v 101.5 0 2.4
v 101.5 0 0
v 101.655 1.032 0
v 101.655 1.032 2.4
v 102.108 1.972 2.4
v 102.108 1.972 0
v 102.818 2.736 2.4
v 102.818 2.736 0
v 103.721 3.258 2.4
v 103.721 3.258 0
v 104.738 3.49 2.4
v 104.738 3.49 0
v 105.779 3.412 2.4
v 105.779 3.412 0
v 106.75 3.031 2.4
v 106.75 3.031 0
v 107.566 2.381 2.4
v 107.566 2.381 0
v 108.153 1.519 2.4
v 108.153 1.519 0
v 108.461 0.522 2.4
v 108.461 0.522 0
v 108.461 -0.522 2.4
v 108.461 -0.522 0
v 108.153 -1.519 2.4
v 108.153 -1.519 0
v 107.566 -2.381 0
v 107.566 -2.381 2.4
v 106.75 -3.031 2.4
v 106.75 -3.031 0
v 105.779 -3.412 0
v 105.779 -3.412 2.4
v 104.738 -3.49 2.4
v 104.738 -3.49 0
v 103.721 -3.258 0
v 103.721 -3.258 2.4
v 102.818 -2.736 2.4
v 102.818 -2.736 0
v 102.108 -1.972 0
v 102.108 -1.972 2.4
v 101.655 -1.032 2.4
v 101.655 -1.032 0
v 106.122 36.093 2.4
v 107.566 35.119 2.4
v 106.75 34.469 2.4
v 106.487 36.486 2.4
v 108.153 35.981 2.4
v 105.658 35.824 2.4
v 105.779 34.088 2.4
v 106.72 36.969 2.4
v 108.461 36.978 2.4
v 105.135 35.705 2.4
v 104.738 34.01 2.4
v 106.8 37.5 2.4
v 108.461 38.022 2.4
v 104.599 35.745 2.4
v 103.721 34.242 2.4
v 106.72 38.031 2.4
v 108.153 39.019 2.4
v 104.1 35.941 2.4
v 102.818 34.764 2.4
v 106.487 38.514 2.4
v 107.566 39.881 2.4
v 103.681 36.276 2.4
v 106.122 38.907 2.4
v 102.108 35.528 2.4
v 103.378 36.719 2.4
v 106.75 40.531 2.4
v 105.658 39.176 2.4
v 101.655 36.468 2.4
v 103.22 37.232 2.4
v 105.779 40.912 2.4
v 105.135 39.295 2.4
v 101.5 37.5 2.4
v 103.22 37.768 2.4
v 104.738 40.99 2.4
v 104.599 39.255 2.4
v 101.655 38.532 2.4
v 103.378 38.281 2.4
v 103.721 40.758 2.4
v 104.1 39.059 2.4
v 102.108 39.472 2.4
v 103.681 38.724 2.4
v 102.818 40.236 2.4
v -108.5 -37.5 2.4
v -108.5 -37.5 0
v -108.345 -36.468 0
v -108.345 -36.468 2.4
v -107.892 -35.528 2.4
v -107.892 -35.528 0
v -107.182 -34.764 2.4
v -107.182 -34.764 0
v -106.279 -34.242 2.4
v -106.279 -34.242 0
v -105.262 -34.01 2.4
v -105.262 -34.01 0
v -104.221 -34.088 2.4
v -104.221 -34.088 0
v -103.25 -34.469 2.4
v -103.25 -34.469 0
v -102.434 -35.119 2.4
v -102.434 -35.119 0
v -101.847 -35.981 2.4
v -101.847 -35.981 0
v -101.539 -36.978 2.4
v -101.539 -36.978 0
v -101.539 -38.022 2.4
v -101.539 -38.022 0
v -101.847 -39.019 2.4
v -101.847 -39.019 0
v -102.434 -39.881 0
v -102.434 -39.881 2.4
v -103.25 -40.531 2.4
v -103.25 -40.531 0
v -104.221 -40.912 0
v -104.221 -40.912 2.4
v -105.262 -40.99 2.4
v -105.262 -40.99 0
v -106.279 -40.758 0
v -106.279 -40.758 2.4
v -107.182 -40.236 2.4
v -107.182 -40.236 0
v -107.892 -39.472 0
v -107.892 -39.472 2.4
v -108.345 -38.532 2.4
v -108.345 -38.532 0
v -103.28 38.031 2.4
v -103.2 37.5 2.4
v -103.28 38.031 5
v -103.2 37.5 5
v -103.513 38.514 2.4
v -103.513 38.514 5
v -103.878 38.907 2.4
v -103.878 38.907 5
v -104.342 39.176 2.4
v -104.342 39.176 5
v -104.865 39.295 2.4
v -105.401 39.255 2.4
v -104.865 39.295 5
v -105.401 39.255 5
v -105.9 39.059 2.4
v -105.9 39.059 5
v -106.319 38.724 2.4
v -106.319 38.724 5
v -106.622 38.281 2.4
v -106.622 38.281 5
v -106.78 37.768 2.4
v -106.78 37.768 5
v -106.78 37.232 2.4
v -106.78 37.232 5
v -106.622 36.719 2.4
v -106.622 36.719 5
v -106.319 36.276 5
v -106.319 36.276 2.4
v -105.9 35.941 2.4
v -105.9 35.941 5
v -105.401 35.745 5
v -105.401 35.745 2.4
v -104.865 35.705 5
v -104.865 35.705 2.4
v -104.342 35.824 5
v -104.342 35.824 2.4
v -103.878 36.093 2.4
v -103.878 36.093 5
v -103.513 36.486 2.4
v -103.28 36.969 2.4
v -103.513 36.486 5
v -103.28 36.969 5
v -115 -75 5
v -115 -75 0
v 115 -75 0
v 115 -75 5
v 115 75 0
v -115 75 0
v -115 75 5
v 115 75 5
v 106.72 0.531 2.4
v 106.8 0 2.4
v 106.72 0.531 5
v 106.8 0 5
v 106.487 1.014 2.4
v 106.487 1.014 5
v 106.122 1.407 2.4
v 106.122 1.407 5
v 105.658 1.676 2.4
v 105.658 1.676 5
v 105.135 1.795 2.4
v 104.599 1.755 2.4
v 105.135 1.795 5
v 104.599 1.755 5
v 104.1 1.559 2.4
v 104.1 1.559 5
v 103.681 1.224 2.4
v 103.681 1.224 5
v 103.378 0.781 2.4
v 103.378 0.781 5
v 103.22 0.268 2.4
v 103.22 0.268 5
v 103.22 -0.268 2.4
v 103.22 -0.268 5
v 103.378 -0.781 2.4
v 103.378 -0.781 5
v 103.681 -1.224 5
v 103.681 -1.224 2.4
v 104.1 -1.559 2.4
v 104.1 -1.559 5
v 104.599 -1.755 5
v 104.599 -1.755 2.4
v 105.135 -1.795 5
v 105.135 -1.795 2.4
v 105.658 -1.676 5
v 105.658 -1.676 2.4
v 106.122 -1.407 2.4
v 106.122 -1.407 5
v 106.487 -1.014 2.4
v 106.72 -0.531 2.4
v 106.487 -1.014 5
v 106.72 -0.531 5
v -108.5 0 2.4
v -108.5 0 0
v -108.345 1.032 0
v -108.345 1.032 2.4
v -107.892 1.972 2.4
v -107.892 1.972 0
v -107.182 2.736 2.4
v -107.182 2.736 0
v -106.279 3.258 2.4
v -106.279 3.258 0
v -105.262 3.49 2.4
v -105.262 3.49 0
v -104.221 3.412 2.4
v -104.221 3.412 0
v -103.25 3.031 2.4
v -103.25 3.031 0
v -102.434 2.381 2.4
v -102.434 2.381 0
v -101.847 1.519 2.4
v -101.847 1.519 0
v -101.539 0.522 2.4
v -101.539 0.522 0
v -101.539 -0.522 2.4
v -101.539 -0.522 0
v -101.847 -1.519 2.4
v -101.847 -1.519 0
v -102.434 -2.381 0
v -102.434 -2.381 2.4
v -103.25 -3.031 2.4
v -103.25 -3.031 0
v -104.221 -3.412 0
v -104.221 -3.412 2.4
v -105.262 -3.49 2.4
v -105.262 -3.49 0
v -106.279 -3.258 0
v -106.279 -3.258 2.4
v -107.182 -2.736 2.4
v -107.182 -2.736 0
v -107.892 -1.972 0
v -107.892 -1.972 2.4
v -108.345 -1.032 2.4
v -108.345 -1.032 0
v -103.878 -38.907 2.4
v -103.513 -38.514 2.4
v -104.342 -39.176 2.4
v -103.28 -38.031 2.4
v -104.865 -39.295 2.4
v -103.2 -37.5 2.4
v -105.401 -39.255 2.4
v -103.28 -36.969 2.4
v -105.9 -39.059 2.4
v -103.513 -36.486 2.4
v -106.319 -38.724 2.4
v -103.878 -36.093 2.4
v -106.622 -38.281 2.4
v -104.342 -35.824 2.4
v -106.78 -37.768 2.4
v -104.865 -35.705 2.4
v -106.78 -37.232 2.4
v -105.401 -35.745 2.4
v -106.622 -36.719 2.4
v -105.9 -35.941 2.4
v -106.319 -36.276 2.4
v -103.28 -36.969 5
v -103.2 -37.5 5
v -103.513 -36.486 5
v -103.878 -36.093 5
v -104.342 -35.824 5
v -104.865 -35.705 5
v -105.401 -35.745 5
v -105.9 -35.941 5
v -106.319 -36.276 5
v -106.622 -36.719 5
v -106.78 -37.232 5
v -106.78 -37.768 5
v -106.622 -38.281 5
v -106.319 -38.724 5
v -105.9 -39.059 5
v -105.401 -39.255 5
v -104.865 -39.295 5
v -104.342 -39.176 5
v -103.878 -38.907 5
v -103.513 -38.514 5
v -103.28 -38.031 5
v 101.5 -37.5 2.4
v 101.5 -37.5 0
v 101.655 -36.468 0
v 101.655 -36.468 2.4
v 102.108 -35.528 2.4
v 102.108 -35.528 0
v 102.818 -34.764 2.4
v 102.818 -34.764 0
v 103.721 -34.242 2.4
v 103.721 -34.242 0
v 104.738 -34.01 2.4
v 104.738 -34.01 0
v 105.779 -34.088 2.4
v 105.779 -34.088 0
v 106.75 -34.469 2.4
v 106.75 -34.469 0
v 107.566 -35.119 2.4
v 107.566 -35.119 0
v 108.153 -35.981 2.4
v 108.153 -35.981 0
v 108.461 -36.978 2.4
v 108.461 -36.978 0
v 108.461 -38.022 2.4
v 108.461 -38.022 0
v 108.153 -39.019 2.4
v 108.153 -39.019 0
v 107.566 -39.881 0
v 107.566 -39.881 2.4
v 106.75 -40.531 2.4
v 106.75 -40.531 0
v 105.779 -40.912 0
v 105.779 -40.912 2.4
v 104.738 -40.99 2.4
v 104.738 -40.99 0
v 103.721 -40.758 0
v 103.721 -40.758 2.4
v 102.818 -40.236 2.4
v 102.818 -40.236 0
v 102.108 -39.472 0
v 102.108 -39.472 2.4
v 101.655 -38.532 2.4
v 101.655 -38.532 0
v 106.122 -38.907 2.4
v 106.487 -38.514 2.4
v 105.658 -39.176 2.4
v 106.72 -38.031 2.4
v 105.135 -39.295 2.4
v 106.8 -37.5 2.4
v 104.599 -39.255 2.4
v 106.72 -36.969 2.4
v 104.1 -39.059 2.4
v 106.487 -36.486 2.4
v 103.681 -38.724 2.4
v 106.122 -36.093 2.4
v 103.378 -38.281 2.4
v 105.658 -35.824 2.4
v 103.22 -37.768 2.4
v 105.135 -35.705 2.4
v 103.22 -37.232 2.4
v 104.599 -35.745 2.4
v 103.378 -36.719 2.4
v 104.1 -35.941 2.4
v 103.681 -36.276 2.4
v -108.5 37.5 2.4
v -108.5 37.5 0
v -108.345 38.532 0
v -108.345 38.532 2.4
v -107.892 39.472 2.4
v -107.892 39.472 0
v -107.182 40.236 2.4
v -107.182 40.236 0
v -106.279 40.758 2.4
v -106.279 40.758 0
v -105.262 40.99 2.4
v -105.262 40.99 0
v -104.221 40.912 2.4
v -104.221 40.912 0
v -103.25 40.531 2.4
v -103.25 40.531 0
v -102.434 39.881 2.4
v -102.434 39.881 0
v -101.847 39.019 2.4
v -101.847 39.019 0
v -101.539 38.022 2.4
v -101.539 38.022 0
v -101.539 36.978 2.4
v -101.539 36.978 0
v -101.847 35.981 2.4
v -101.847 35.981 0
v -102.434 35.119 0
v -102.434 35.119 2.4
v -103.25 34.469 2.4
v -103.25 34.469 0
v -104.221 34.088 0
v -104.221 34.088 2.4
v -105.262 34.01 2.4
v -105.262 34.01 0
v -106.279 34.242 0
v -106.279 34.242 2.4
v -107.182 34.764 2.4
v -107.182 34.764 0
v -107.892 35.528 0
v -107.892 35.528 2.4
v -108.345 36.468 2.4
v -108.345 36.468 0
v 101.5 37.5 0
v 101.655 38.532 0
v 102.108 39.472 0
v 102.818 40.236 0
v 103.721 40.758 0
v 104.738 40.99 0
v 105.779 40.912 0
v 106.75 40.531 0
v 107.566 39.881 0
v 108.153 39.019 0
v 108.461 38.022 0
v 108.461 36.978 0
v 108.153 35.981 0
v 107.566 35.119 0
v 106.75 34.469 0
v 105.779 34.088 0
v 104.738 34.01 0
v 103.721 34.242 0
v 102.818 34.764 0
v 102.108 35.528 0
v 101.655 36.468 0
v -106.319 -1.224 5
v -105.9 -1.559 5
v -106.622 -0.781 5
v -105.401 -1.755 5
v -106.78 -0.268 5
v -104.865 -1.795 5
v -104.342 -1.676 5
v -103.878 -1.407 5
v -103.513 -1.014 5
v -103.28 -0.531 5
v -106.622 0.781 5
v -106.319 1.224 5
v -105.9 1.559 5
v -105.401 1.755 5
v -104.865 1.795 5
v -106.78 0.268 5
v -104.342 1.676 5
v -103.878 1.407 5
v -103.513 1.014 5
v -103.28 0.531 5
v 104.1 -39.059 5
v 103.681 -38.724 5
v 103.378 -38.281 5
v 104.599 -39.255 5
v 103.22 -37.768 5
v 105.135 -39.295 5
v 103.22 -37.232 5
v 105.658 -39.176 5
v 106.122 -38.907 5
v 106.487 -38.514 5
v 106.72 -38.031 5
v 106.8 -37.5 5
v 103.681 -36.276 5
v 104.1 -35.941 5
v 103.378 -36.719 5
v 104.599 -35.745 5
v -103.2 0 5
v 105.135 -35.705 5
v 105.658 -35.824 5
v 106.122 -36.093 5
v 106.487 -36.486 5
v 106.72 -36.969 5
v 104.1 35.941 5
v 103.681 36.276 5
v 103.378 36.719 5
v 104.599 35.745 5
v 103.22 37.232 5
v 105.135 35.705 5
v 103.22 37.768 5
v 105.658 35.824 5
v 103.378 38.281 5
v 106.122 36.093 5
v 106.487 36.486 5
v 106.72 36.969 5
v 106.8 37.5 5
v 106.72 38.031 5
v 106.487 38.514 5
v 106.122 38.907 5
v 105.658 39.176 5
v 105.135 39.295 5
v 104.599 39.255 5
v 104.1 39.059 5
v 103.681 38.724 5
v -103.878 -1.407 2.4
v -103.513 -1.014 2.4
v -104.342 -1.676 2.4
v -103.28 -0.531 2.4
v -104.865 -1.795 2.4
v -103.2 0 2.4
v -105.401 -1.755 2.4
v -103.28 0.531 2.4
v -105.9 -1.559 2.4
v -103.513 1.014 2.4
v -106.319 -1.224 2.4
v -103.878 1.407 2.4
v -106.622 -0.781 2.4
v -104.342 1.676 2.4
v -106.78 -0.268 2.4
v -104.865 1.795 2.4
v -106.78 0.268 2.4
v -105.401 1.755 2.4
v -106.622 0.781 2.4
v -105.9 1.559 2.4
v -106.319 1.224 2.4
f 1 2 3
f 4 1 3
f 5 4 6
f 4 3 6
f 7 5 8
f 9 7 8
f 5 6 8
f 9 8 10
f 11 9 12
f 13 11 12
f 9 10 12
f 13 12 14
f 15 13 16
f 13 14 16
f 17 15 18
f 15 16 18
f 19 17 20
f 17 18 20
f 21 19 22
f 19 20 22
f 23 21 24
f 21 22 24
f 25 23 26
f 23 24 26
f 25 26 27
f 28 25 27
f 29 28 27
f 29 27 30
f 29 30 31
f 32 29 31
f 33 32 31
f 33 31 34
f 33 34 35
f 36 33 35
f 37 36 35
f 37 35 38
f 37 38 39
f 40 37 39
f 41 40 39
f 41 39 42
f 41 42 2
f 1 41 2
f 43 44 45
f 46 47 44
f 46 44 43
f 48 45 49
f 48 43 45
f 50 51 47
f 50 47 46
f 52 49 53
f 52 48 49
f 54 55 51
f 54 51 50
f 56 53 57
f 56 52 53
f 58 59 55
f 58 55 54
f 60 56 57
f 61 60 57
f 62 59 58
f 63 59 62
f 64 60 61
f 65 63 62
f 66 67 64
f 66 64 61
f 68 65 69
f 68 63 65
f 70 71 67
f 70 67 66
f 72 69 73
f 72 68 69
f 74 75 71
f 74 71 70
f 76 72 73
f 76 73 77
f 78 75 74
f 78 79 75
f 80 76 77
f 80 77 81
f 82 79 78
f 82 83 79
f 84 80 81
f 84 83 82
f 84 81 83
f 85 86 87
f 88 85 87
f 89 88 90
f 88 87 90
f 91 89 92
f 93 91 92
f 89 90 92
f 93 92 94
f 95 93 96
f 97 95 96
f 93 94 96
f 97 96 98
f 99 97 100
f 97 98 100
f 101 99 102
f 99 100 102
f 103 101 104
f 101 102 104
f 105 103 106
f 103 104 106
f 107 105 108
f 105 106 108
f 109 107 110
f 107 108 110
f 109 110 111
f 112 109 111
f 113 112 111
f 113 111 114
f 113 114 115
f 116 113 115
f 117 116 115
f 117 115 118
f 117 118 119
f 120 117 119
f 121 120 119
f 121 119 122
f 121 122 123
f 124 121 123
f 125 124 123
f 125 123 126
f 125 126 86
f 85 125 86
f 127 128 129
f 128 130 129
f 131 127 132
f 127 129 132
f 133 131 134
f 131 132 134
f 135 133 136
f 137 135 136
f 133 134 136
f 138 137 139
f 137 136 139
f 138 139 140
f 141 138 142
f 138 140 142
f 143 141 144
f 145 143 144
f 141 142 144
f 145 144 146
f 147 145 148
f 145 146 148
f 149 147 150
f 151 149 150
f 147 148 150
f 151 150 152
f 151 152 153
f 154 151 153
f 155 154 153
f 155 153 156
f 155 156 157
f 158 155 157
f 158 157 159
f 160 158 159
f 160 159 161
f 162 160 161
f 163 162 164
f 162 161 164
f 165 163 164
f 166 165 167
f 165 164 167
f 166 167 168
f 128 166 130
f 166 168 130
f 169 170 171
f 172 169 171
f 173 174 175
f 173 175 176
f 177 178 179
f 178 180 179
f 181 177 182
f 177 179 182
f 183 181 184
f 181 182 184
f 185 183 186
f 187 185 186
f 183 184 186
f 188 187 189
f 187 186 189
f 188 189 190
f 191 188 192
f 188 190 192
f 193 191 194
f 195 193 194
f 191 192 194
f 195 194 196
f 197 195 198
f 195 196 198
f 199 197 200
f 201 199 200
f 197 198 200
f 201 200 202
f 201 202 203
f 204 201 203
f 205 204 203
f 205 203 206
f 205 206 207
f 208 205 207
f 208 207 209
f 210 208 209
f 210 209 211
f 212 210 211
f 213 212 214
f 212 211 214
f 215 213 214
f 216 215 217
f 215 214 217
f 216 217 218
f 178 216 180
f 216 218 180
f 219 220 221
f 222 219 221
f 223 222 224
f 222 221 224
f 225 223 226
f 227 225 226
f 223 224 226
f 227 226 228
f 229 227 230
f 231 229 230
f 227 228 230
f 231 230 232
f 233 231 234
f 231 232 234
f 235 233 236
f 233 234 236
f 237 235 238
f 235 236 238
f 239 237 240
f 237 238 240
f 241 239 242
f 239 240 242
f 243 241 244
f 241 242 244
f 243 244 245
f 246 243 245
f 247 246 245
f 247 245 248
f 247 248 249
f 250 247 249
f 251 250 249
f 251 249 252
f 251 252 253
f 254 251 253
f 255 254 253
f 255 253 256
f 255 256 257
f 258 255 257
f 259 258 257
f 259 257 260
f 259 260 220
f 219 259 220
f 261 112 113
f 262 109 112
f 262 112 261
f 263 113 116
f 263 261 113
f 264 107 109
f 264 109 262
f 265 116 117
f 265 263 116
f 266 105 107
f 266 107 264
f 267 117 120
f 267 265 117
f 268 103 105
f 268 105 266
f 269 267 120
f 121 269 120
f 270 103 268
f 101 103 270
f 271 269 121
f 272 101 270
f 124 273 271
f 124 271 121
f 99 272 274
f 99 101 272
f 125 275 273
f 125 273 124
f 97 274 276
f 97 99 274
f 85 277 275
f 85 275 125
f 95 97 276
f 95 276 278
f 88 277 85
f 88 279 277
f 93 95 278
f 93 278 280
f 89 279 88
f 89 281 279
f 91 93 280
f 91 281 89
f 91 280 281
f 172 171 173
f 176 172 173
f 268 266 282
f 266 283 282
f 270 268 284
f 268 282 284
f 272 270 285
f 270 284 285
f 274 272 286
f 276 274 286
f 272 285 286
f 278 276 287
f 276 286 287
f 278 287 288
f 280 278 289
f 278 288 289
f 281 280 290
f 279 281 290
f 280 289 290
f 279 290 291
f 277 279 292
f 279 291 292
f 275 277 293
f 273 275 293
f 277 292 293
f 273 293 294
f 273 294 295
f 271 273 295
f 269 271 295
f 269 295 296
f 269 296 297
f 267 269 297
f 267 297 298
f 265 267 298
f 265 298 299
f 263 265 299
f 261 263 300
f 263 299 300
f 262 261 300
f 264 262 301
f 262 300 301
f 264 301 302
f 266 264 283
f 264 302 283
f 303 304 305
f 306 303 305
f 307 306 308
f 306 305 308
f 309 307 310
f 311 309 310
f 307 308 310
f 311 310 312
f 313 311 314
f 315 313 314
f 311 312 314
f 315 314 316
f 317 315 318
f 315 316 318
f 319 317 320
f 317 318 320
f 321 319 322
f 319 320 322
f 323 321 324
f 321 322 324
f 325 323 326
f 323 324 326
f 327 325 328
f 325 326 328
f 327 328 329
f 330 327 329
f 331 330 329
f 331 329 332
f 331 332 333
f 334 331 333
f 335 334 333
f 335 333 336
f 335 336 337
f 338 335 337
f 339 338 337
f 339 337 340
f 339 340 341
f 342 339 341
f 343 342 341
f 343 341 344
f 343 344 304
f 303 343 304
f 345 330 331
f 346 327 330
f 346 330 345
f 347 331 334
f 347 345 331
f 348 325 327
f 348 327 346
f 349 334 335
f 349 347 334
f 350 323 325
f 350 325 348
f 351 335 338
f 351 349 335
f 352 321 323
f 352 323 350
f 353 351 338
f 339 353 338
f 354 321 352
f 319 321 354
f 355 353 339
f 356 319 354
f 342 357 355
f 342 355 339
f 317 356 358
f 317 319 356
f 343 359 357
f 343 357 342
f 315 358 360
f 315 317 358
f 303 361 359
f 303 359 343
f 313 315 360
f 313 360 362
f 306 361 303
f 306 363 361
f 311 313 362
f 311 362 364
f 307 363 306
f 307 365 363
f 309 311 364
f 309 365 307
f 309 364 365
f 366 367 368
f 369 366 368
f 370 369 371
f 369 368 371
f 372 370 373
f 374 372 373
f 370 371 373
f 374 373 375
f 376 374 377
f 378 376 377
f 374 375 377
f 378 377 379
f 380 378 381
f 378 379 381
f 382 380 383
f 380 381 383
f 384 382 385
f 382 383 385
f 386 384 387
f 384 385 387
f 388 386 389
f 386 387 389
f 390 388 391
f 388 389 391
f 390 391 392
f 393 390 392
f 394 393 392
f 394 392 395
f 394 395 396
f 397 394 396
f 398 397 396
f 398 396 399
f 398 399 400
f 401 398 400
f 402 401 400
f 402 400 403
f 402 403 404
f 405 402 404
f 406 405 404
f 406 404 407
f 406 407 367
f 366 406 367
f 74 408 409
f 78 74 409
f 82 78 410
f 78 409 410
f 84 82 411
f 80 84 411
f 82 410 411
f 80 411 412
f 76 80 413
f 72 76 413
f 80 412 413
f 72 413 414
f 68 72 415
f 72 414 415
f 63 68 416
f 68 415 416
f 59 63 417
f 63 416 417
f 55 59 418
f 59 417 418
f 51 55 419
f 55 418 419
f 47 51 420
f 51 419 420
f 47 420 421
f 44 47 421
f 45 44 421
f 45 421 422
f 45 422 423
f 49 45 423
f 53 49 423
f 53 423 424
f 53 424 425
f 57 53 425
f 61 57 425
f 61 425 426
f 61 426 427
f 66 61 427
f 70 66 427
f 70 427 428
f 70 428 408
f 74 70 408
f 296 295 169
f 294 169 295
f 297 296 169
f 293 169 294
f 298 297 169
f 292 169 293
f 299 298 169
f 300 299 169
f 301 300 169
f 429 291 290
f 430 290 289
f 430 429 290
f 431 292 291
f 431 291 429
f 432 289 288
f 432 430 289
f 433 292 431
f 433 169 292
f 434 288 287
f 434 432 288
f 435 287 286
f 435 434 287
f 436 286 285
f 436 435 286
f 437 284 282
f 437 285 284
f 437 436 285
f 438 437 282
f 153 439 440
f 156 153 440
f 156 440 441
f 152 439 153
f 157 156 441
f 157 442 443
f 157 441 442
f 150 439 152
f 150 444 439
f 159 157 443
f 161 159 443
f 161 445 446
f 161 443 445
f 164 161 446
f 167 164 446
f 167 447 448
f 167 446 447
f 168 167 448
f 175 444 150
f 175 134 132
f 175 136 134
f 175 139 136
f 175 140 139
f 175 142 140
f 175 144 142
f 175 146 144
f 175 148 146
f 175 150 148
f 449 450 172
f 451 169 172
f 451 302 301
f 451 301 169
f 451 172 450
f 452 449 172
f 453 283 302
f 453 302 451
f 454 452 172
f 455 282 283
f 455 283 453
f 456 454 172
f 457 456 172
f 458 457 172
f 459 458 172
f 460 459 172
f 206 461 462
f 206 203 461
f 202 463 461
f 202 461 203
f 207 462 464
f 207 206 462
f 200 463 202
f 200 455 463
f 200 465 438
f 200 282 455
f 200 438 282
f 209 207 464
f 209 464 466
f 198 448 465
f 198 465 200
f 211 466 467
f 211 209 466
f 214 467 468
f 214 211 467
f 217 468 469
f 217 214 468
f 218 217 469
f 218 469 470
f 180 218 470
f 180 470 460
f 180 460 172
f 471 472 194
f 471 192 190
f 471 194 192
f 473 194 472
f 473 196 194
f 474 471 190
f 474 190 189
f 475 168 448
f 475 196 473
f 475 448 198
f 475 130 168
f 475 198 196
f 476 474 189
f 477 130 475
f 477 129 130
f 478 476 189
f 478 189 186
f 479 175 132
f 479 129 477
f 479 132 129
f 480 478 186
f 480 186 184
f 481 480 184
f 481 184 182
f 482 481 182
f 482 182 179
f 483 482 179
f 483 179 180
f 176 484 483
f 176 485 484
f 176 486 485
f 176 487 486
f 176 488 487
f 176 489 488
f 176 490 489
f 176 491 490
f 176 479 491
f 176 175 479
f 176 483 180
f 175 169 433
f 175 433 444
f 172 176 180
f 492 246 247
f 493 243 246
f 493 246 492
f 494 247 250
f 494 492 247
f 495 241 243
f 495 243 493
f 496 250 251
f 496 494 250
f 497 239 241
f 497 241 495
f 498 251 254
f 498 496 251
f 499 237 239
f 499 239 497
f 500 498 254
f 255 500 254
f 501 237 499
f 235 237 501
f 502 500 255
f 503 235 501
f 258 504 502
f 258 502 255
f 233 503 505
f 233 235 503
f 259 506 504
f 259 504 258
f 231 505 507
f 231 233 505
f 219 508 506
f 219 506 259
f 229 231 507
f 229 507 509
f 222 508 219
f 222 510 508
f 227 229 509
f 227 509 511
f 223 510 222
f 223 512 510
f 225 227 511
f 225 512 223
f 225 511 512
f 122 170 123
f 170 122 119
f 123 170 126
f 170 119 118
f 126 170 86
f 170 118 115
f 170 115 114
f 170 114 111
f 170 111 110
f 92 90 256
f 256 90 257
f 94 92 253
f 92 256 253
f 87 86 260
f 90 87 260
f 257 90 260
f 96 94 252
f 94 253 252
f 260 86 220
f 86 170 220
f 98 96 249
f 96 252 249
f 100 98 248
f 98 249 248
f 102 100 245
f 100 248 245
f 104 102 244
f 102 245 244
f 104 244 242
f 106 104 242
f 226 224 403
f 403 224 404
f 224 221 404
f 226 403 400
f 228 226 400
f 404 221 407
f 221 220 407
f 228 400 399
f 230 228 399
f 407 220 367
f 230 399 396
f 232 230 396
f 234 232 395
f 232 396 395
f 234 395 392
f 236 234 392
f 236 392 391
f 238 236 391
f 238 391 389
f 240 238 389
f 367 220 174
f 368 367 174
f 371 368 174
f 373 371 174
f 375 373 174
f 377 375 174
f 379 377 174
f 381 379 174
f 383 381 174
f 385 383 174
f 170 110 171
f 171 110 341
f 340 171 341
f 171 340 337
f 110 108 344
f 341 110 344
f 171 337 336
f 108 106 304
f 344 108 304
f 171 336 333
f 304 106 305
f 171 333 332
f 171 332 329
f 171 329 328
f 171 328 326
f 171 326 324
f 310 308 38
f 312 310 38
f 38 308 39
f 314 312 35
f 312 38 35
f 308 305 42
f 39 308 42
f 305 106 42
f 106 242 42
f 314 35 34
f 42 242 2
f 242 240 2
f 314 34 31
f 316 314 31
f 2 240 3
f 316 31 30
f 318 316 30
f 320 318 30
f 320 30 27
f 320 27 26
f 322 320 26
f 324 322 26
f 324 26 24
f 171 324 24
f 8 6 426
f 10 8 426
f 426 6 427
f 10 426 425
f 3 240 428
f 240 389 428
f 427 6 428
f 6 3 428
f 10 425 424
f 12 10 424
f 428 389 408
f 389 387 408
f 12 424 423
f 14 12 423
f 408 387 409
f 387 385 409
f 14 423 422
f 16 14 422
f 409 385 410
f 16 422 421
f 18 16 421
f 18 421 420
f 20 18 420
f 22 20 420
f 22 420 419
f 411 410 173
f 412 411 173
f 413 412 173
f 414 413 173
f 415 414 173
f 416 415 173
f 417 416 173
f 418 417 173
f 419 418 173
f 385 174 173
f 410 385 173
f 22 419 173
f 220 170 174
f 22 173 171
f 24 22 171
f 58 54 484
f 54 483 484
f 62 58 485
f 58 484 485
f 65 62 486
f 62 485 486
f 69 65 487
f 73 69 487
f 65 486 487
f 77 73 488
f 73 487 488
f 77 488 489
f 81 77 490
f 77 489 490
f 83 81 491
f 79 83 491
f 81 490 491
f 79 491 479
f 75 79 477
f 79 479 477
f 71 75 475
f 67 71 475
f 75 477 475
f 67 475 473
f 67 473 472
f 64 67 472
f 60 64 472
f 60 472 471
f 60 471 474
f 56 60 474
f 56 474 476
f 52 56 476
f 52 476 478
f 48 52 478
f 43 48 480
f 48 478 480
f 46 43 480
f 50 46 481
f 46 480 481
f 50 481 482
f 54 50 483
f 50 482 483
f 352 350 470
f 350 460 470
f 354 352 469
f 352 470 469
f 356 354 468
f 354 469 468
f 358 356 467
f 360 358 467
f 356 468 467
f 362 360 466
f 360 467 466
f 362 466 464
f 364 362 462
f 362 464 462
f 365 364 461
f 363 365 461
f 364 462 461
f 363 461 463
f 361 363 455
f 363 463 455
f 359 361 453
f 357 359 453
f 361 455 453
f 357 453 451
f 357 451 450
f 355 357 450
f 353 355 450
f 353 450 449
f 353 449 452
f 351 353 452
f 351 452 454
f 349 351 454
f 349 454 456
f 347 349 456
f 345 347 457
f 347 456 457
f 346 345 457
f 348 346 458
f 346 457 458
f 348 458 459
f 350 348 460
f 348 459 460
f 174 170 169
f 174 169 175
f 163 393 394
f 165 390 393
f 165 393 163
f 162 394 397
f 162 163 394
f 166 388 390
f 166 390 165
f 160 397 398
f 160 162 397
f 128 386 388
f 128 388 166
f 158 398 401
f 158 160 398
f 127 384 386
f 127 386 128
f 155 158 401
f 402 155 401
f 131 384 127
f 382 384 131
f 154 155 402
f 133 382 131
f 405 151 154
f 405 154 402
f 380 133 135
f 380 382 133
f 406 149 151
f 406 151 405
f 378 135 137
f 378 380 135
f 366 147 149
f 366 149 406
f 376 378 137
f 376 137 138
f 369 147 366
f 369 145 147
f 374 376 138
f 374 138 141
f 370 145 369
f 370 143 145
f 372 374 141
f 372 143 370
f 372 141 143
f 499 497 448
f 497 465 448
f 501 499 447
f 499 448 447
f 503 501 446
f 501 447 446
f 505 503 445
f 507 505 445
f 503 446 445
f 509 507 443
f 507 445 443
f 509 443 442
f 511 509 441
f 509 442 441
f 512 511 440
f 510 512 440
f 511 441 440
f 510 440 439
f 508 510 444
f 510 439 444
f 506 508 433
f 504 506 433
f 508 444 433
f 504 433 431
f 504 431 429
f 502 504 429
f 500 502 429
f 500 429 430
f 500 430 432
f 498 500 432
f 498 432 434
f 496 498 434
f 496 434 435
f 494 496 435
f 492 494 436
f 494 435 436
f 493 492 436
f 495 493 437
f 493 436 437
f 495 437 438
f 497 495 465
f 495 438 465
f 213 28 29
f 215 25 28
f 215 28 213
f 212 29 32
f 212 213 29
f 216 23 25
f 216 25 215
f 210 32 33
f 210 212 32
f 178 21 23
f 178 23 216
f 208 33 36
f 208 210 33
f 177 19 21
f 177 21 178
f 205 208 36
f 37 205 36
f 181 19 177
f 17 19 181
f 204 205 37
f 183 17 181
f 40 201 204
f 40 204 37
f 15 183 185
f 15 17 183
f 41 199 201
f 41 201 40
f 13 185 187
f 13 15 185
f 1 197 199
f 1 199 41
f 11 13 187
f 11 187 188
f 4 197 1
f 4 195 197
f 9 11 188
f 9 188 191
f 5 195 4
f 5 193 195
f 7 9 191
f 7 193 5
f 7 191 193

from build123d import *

# Parameters (mm, degrees)
SZKIC1_W                                          = 230
SZKIC1_H                                          = 150
DODANIE_WYCI_GNI_CIE1_DEPTH                       = 5
POG_BIENIE_WALCOWE_POD_M3_RUB_Z_BEM_S_D           = 3.6
POG_BIENIE_WALCOWE_POD_M3_RUB_Z_BEM_S_DEPTH       = 6.7
POG_BIENIE_WALCOWE_POD_M3_RUB_Z_BEM_S_CBORE_D     = 7
POG_BIENIE_WALCOWE_POD_M3_RUB_Z_BEM_S_CBORE_DEPTH = 2.4
POG_BIENIE_WALCOWE_POD_M3_RUB_Z_BEM_S_TIP         = 1.081549114


with BuildPart() as part:
    # Szkic1 → Dodanie-wyciągnięcie1 (new body)
    with BuildSketch(Plane.XY):
        Rectangle(SZKIC1_W, SZKIC1_H)
    extrude(amount=DODANIE_WYCI_GNI_CIE1_DEPTH)

    # Pogłębienie walcowe pod M3 Śrubę z łbem stożkowym ściętym1
    with Locations(Plane(origin=(0, 0, 0), x_dir=(-1, 0, 0), z_dir=(0, 0, -1))):
        with Locations((105, 37.5), (105, 0), (105, -37.5), (-105, -37.5), (-105, 0), (-105, 37.5)):
            CounterBoreHole(POG_BIENIE_WALCOWE_POD_M3_RUB_Z_BEM_S_D / 2, POG_BIENIE_WALCOWE_POD_M3_RUB_Z_BEM_S_CBORE_D / 2, POG_BIENIE_WALCOWE_POD_M3_RUB_Z_BEM_S_CBORE_DEPTH, depth=POG_BIENIE_WALCOWE_POD_M3_RUB_Z_BEM_S_DEPTH)
            with Locations((0, 0, -(POG_BIENIE_WALCOWE_POD_M3_RUB_Z_BEM_S_DEPTH + POG_BIENIE_WALCOWE_POD_M3_RUB_Z_BEM_S_TIP / 2))):  # 118° drill point
                Cone(0, POG_BIENIE_WALCOWE_POD_M3_RUB_Z_BEM_S_D / 2, POG_BIENIE_WALCOWE_POD_M3_RUB_Z_BEM_S_TIP, mode=Mode.SUBTRACT)


solid = part.part
